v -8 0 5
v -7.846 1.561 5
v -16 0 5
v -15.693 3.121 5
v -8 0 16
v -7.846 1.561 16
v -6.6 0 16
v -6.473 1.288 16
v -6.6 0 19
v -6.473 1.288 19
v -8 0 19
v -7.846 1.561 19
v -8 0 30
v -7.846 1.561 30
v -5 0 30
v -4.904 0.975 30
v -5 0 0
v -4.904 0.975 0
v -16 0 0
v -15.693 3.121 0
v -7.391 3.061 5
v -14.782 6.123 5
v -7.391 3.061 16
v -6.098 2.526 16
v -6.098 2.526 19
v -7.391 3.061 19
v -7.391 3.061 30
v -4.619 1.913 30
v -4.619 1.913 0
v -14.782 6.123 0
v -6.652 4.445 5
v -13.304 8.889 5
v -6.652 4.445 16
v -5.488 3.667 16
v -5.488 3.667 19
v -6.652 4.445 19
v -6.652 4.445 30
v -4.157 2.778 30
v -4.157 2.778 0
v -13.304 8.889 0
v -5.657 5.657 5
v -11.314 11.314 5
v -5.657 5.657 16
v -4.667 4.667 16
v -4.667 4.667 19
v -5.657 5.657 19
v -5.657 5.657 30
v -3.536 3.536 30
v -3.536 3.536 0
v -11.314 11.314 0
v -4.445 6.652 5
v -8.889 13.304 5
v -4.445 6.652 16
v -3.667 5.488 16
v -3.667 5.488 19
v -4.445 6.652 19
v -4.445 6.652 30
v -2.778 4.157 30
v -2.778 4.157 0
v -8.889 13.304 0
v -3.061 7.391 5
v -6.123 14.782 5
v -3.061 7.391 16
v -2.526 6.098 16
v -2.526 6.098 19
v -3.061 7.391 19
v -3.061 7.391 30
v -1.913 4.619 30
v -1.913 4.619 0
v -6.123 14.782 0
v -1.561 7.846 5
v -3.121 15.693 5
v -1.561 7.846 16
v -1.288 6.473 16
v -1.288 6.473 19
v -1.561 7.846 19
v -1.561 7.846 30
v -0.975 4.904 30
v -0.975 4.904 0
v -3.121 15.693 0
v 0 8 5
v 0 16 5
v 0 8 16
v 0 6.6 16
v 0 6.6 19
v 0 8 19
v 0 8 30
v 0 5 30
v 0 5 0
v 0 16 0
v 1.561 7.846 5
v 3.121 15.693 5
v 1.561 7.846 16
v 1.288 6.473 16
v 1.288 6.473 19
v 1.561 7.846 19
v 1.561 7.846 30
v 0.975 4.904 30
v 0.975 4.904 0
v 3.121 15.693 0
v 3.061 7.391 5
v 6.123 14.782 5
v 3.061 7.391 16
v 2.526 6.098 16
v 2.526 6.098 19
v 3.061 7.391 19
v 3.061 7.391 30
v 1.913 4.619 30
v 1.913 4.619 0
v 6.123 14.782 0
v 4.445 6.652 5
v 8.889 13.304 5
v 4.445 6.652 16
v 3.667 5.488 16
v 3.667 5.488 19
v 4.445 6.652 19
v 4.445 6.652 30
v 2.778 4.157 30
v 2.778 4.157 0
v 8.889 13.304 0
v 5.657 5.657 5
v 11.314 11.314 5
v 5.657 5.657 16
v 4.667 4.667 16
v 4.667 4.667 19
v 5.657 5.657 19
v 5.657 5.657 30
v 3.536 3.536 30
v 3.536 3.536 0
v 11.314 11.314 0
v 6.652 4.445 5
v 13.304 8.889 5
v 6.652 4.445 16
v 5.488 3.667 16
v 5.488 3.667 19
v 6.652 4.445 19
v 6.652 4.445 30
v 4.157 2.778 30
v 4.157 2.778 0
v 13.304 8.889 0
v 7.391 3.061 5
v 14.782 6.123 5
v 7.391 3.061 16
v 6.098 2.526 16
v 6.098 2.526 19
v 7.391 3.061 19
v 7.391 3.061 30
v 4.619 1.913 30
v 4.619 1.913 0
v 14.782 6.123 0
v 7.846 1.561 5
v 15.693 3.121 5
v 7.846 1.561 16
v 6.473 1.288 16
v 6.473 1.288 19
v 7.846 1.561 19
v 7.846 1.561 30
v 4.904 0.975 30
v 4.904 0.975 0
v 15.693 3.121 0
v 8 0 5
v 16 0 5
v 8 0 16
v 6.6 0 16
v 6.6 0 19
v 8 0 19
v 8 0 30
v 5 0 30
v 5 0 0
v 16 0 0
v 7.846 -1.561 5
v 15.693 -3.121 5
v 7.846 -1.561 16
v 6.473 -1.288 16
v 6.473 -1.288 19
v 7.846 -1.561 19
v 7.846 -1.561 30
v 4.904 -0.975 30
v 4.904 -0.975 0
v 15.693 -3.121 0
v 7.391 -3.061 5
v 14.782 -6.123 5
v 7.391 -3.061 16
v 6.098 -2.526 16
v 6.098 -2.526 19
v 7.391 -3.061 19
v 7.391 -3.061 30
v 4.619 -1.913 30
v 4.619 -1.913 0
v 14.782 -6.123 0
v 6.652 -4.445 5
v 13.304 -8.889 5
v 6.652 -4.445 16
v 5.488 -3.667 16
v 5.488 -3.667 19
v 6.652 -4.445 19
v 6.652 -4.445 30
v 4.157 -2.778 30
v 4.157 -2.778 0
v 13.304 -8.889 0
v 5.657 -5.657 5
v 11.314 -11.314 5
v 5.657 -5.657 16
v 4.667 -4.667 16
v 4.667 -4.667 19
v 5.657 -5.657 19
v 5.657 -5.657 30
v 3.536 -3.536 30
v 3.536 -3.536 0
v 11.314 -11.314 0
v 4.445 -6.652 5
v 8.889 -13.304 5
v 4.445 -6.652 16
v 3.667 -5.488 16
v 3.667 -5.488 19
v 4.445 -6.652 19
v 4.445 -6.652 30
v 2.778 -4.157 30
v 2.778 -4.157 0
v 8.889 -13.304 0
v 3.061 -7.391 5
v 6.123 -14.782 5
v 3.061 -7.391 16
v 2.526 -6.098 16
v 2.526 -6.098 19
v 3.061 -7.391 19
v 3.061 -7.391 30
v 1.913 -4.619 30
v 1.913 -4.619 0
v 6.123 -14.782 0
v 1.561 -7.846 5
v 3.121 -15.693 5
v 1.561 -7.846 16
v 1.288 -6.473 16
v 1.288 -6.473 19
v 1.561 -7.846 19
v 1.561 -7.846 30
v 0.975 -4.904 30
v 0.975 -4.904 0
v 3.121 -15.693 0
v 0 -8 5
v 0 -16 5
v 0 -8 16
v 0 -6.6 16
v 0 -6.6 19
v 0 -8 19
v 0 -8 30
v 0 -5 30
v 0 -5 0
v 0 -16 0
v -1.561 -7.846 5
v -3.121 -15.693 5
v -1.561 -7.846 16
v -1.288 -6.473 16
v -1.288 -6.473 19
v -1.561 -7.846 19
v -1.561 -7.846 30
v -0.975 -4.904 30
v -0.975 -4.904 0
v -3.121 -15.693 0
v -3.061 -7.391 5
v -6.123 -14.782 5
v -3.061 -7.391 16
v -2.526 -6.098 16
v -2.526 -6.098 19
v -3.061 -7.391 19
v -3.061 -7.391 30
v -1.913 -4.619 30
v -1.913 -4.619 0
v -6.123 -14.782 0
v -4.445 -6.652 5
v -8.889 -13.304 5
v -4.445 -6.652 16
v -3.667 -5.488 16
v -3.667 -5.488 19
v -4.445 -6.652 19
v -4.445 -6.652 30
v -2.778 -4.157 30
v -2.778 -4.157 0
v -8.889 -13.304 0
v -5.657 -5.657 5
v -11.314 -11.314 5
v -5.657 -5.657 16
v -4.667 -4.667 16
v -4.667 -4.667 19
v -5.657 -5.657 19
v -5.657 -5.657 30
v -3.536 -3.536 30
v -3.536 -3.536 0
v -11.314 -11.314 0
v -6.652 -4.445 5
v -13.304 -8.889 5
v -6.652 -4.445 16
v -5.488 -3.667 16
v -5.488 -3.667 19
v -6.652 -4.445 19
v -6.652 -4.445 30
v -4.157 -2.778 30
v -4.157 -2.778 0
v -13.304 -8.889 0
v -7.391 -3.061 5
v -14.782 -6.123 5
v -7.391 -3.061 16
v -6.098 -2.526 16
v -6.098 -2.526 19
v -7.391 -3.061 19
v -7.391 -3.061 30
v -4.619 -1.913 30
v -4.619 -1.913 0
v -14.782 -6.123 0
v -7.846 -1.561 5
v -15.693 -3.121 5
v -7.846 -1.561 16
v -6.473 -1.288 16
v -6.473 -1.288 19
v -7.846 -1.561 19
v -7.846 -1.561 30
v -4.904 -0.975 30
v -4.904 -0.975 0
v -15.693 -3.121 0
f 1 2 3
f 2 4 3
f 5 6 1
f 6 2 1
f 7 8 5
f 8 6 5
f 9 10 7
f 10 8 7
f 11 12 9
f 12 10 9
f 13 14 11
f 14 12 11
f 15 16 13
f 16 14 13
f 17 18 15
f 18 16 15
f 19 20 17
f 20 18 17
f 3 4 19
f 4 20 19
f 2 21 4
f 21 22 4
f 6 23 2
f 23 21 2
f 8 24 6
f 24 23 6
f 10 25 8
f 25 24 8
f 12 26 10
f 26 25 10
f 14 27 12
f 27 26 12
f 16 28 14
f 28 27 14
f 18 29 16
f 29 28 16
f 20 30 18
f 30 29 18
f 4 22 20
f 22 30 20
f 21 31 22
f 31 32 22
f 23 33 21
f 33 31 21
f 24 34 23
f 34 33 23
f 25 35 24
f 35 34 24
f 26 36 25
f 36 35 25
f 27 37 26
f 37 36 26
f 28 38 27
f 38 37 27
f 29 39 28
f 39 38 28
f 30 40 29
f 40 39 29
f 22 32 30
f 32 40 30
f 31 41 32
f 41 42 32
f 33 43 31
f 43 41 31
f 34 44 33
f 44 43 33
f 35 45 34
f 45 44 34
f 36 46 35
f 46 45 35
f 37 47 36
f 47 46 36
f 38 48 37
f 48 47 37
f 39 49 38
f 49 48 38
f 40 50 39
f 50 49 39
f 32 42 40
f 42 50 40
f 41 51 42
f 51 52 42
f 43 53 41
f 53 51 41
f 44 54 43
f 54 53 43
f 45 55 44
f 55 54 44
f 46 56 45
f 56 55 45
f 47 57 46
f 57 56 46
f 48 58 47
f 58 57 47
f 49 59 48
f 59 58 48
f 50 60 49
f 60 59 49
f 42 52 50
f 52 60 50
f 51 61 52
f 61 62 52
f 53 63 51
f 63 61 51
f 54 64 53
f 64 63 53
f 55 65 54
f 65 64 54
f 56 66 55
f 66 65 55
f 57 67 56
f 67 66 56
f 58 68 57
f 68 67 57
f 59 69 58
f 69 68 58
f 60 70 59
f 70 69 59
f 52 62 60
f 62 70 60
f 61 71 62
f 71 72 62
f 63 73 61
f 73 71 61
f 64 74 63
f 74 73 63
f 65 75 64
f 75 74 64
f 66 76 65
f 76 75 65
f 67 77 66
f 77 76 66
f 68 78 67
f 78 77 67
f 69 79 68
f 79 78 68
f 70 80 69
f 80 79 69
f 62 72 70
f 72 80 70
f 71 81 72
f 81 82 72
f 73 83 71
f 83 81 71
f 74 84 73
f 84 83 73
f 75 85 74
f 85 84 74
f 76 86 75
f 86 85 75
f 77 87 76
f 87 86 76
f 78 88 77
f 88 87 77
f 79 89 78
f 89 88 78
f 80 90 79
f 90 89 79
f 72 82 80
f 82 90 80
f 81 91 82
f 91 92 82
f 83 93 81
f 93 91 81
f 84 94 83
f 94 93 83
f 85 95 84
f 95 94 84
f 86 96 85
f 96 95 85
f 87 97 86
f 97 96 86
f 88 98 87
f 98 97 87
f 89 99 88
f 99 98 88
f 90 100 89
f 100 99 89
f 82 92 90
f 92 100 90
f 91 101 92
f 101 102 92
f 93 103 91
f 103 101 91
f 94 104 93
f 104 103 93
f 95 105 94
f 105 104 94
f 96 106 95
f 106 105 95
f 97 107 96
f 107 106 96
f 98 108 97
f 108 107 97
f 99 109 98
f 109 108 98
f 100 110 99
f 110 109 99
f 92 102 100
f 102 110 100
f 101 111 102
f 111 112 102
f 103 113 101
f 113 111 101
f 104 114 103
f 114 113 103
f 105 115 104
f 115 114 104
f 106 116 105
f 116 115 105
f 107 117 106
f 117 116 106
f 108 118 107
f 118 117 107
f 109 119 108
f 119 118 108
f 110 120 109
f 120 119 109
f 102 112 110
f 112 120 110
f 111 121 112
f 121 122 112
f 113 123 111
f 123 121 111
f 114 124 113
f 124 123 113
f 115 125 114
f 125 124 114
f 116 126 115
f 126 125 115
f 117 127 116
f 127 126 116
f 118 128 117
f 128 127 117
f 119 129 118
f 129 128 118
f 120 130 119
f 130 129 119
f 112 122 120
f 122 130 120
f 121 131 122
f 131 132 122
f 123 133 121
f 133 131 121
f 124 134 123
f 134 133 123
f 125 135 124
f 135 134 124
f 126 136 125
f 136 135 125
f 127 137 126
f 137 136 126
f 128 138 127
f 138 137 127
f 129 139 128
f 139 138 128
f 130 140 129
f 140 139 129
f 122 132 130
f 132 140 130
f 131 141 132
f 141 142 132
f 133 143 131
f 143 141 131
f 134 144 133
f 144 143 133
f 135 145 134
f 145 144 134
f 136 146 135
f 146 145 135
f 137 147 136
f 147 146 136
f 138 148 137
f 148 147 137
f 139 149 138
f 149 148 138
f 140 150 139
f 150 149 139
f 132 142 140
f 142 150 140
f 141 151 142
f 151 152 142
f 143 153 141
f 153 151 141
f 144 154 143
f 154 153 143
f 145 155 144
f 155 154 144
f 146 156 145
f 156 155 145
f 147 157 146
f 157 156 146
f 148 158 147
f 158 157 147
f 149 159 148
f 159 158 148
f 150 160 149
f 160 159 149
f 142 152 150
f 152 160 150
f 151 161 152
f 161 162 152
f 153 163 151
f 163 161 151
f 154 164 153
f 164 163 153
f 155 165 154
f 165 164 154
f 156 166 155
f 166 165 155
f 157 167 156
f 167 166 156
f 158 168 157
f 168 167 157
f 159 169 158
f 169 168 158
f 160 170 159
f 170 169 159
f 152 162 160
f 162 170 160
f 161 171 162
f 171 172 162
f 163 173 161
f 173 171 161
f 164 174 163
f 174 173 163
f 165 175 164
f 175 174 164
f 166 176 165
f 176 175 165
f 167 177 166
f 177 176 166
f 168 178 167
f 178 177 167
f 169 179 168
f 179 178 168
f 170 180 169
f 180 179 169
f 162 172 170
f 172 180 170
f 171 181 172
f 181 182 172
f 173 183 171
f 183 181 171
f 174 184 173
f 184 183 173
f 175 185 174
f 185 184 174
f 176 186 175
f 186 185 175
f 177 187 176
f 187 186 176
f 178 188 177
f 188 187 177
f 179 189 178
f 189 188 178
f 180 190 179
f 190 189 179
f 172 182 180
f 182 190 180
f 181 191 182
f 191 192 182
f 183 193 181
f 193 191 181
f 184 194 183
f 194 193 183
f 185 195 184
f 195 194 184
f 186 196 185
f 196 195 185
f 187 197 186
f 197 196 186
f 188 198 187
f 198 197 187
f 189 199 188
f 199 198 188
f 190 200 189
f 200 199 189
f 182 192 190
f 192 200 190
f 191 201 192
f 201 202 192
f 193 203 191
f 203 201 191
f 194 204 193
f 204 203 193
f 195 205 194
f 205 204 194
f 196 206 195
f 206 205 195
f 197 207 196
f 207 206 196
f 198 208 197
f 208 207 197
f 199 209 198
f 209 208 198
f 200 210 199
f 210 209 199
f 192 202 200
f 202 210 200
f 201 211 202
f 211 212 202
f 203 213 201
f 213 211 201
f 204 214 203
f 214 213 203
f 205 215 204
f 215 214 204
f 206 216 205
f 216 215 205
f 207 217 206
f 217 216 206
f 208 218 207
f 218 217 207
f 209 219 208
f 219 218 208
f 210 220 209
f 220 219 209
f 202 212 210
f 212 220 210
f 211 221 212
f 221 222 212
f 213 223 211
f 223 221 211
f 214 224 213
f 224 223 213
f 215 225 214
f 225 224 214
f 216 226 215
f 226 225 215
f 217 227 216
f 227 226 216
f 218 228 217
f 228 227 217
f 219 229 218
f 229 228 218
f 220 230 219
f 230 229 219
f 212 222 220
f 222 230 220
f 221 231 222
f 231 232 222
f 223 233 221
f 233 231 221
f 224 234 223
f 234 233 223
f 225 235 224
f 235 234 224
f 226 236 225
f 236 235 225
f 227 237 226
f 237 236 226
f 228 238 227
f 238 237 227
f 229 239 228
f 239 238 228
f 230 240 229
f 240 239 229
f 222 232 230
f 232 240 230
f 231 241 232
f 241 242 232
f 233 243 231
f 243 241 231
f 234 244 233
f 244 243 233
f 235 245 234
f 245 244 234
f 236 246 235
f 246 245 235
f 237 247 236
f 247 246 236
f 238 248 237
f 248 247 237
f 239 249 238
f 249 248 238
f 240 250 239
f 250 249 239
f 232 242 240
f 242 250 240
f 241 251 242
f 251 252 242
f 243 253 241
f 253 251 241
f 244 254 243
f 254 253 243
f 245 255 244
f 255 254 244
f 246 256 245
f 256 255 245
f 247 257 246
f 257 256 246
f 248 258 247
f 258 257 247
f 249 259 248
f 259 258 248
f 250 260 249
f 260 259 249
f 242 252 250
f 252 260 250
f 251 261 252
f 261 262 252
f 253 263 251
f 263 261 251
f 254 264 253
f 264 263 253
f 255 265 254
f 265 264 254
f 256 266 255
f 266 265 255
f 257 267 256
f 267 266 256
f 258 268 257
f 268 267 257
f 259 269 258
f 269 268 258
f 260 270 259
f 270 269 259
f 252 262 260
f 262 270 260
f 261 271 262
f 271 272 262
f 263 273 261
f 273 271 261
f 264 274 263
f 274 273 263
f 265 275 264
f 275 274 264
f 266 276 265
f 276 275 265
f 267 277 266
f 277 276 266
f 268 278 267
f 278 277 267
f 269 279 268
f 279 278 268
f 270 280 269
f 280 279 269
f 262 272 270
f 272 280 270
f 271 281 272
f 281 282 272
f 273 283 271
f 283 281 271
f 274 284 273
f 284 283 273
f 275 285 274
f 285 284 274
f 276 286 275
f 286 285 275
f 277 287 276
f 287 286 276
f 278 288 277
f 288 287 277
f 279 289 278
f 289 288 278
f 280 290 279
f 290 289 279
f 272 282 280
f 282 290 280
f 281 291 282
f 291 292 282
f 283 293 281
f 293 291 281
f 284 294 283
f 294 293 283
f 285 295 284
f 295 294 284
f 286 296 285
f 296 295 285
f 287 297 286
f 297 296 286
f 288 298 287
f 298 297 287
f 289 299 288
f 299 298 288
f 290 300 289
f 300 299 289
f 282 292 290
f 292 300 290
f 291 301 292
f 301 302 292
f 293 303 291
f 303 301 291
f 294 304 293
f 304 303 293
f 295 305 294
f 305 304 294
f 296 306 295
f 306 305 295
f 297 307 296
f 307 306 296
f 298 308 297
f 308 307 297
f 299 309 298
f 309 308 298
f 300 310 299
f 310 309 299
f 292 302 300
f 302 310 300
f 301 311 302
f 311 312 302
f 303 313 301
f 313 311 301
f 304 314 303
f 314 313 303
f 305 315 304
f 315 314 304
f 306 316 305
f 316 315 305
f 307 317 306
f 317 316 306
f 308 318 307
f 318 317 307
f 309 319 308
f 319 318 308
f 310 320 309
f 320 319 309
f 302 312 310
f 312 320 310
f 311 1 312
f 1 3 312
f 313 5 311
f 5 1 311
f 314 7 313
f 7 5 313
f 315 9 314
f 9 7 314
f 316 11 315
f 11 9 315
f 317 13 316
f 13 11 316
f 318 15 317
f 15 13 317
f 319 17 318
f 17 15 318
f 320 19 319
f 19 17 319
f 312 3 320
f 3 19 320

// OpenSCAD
$fn = 32;

// ----------------------------------------------------------------------
// Grooved revolve: flanged, bore R5
// ----------------------------------------------------------------------

// --- parameters (mm) ---
bore_r = 5;               // bore radius
outer_r = 8;              // outer radius of the body
total_h = 30;             // overall height, Z
wall = 3;                 // radial wall thickness
groove_w = 3;             // groove width
groove_d = 1.4;           // groove depth
grooves = 1;              // number of outer grooves
flange_r = 16;            // flange radius
flange_h = 5;             // flange height

bbox_x = 2 * flange_r;  // full diameter
bore_d = 2 * bore_r;  // bore diameter
body_d = 2 * outer_r;  // body diameter
flange_d = 2 * flange_r;  // flange diameter
revolve_angle = 360;  // full turn around the Z axis

profile = [[5, 0], [8, 0], [16, 0], [16, 5], [8, 5], [8, 16], [6.6, 16], [6.6, 19], [8, 19], [8, 30], [5, 30]];  // primary outline, 11 points, counter clockwise

// --- the one profile operation ---
rotate_extrude(angle = revolve_angle) polygon(points = profile);
